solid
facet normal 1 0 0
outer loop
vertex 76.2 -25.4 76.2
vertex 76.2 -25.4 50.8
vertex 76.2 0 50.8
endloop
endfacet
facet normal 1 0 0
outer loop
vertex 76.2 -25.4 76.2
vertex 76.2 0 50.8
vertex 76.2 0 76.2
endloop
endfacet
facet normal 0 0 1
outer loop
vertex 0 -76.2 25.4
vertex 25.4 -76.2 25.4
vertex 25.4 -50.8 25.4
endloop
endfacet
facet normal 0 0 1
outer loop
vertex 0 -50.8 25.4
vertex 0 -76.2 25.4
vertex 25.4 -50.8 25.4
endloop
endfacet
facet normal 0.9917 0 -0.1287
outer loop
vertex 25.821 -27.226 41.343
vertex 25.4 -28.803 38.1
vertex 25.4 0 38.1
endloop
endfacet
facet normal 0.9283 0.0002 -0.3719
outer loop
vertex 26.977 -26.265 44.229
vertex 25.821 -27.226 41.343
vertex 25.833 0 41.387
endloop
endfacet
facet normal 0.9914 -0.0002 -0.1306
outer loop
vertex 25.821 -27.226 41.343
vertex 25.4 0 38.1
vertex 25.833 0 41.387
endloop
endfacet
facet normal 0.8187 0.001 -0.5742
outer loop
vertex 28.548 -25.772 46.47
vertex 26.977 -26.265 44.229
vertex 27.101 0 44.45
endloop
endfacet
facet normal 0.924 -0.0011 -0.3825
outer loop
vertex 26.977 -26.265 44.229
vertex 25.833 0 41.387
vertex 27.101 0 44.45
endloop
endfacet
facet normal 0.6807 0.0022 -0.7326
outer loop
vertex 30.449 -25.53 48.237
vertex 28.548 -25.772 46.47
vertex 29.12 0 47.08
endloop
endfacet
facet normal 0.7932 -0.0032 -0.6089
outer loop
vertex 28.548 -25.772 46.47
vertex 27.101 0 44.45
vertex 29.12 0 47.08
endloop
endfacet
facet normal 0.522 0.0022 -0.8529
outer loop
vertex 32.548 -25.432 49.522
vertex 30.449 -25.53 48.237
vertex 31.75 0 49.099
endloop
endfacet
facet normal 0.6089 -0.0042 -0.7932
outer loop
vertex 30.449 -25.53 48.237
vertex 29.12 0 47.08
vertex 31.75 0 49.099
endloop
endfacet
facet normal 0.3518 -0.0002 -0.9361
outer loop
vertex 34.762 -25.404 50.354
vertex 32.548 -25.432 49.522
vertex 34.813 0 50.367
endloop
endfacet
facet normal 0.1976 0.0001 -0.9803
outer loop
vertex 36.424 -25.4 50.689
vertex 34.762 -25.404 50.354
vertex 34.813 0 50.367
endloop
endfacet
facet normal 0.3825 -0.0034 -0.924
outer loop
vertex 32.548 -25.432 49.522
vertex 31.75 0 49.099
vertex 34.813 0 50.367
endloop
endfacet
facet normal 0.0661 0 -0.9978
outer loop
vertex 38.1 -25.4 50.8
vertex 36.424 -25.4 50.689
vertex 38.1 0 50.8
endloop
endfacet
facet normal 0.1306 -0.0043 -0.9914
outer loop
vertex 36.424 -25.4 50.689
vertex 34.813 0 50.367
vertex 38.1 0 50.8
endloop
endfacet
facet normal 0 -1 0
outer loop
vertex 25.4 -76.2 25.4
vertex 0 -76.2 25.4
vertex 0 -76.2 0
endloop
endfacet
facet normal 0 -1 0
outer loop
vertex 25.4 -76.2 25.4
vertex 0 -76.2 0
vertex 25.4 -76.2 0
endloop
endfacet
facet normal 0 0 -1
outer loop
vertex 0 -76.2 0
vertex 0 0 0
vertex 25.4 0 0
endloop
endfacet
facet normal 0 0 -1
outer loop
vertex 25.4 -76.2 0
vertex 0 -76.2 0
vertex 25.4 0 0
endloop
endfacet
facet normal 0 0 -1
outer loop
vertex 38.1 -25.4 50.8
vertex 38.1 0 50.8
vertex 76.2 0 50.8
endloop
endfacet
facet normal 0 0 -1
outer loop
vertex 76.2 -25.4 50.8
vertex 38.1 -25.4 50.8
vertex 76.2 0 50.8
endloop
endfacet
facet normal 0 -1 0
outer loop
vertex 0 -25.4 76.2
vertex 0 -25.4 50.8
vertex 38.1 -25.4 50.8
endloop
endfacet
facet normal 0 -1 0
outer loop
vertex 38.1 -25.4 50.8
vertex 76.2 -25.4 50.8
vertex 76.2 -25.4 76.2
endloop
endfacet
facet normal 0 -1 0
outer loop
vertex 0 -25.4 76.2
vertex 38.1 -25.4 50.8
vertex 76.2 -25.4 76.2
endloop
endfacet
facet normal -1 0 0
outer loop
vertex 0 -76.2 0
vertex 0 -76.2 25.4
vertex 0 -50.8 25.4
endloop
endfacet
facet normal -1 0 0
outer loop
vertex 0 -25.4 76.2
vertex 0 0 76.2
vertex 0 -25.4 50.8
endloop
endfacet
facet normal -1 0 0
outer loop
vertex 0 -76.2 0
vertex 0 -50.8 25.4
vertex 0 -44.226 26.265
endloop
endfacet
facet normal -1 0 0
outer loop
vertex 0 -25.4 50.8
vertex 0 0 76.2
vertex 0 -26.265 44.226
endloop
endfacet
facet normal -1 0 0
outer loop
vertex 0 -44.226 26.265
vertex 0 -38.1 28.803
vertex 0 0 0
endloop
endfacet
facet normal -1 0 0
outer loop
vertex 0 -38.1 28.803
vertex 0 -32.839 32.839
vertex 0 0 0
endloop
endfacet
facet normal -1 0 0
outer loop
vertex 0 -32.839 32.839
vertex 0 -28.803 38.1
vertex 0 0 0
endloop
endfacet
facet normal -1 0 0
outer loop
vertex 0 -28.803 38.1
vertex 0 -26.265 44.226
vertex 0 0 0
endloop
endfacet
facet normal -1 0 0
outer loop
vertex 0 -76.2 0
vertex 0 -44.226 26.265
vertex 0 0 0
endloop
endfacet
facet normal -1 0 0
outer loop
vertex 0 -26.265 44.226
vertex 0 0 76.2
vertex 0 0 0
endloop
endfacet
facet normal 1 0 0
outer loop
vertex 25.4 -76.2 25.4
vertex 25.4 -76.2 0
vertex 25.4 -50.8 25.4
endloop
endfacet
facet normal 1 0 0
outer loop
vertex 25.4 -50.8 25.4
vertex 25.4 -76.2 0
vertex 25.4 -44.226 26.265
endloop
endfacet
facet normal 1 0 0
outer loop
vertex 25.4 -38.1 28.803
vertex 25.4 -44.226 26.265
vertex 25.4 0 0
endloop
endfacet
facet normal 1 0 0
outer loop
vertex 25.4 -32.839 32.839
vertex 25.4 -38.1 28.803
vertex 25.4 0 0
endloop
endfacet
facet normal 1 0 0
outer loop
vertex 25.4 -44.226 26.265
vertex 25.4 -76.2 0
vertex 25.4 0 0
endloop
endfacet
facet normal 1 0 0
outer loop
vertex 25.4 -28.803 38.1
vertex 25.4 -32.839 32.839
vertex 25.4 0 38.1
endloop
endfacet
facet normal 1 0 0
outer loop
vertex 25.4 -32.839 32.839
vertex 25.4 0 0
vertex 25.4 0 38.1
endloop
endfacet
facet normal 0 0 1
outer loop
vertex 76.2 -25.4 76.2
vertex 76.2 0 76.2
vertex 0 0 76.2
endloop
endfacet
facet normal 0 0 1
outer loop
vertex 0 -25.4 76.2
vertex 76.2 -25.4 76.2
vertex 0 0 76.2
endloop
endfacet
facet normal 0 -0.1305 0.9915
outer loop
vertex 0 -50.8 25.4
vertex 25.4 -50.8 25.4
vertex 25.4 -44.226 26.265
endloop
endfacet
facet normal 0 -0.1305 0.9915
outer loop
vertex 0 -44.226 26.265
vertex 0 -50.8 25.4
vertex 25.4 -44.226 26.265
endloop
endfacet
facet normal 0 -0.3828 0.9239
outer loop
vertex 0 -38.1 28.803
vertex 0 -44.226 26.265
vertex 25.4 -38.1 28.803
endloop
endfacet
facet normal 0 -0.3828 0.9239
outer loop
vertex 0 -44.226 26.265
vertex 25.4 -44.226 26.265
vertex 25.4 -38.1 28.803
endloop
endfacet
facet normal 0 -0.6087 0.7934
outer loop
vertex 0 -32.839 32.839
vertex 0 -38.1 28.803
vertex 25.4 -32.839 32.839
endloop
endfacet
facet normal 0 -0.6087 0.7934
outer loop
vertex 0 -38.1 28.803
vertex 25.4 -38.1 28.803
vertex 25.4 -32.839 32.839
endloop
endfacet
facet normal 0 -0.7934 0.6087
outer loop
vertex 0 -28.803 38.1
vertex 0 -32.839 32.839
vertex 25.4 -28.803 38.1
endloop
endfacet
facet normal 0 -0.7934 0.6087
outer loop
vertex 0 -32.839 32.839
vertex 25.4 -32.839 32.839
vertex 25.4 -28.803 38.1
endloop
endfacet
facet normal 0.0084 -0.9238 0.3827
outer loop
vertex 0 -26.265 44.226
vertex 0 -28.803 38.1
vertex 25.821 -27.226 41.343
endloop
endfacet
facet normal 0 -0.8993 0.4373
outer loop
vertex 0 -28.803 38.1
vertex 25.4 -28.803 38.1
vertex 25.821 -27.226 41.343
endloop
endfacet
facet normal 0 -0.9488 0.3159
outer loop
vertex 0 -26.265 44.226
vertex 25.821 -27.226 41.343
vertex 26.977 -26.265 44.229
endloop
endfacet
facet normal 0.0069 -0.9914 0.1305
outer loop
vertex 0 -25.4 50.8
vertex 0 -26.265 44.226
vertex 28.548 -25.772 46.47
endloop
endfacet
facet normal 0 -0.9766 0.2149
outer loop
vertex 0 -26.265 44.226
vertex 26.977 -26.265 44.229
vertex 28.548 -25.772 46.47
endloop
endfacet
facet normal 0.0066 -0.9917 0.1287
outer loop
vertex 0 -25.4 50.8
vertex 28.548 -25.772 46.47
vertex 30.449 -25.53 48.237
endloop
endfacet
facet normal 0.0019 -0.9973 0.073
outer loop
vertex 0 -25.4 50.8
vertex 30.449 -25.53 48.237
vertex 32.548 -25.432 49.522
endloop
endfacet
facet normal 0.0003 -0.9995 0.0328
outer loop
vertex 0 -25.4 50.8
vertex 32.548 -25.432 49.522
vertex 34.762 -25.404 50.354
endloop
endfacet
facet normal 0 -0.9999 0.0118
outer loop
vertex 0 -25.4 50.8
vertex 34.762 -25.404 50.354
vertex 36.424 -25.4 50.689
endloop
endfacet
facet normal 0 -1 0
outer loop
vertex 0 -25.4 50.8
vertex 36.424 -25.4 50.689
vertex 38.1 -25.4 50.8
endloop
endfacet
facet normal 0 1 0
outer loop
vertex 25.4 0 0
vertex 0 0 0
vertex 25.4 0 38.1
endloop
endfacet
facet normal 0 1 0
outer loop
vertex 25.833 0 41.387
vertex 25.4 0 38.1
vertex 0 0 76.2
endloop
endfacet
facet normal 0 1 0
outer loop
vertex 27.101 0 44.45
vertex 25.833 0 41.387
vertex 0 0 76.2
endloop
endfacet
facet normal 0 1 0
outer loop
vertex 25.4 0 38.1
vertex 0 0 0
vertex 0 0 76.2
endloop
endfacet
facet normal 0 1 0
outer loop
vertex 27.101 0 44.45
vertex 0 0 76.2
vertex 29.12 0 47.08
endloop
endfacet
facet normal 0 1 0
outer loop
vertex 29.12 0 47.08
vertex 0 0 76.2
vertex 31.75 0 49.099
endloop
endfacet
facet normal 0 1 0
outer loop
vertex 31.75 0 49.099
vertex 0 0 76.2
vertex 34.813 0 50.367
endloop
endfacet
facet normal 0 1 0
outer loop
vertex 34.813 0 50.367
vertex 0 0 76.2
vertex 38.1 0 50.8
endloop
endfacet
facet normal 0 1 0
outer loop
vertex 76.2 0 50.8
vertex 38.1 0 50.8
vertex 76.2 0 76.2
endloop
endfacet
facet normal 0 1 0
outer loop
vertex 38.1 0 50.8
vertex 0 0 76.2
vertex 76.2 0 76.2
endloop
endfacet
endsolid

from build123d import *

# Parameters (mm, degrees)
F1_DEPTH = 76.2
F3_DEPTH = 76.201


with BuildPart() as f1:
    # F0 (on Front) → F1 (new body)
    with BuildSketch(Plane.XZ):
        with BuildLine():
            Line((0, 76.2), (0, 0))
            Line((0, 0), (25.4, 0))
            Line((25.4, 0), (25.4, 38.1))
            ThreePointArc((25.4, 38.1), (29.119744, 47.080256), (38.1, 50.8))
            Line((38.1, 50.8), (76.2, 50.8))
            Line((76.2, 50.8), (76.2, 76.2))
            Line((76.2, 76.2), (0, 76.2))
        make_face()
    extrude(amount=F1_DEPTH)

    # F2 (on face) → F3 (cut, through all)
    with BuildSketch(Plane.YZ.offset(76.2)):
        with BuildLine():
            Line((-76.2, 76.2), (-76.2, 25.4))
            Line((-76.2, 25.4), (-50.8, 25.4))
            ThreePointArc((-50.8, 25.4), (-32.839488, 32.839488), (-25.4, 50.8))
            Line((-25.4, 50.8), (-25.4, 76.2))
            Line((-25.4, 76.2), (-76.2, 76.2))
        make_face()
    extrude(amount=-F3_DEPTH, mode=Mode.SUBTRACT)


solid = f1.part
